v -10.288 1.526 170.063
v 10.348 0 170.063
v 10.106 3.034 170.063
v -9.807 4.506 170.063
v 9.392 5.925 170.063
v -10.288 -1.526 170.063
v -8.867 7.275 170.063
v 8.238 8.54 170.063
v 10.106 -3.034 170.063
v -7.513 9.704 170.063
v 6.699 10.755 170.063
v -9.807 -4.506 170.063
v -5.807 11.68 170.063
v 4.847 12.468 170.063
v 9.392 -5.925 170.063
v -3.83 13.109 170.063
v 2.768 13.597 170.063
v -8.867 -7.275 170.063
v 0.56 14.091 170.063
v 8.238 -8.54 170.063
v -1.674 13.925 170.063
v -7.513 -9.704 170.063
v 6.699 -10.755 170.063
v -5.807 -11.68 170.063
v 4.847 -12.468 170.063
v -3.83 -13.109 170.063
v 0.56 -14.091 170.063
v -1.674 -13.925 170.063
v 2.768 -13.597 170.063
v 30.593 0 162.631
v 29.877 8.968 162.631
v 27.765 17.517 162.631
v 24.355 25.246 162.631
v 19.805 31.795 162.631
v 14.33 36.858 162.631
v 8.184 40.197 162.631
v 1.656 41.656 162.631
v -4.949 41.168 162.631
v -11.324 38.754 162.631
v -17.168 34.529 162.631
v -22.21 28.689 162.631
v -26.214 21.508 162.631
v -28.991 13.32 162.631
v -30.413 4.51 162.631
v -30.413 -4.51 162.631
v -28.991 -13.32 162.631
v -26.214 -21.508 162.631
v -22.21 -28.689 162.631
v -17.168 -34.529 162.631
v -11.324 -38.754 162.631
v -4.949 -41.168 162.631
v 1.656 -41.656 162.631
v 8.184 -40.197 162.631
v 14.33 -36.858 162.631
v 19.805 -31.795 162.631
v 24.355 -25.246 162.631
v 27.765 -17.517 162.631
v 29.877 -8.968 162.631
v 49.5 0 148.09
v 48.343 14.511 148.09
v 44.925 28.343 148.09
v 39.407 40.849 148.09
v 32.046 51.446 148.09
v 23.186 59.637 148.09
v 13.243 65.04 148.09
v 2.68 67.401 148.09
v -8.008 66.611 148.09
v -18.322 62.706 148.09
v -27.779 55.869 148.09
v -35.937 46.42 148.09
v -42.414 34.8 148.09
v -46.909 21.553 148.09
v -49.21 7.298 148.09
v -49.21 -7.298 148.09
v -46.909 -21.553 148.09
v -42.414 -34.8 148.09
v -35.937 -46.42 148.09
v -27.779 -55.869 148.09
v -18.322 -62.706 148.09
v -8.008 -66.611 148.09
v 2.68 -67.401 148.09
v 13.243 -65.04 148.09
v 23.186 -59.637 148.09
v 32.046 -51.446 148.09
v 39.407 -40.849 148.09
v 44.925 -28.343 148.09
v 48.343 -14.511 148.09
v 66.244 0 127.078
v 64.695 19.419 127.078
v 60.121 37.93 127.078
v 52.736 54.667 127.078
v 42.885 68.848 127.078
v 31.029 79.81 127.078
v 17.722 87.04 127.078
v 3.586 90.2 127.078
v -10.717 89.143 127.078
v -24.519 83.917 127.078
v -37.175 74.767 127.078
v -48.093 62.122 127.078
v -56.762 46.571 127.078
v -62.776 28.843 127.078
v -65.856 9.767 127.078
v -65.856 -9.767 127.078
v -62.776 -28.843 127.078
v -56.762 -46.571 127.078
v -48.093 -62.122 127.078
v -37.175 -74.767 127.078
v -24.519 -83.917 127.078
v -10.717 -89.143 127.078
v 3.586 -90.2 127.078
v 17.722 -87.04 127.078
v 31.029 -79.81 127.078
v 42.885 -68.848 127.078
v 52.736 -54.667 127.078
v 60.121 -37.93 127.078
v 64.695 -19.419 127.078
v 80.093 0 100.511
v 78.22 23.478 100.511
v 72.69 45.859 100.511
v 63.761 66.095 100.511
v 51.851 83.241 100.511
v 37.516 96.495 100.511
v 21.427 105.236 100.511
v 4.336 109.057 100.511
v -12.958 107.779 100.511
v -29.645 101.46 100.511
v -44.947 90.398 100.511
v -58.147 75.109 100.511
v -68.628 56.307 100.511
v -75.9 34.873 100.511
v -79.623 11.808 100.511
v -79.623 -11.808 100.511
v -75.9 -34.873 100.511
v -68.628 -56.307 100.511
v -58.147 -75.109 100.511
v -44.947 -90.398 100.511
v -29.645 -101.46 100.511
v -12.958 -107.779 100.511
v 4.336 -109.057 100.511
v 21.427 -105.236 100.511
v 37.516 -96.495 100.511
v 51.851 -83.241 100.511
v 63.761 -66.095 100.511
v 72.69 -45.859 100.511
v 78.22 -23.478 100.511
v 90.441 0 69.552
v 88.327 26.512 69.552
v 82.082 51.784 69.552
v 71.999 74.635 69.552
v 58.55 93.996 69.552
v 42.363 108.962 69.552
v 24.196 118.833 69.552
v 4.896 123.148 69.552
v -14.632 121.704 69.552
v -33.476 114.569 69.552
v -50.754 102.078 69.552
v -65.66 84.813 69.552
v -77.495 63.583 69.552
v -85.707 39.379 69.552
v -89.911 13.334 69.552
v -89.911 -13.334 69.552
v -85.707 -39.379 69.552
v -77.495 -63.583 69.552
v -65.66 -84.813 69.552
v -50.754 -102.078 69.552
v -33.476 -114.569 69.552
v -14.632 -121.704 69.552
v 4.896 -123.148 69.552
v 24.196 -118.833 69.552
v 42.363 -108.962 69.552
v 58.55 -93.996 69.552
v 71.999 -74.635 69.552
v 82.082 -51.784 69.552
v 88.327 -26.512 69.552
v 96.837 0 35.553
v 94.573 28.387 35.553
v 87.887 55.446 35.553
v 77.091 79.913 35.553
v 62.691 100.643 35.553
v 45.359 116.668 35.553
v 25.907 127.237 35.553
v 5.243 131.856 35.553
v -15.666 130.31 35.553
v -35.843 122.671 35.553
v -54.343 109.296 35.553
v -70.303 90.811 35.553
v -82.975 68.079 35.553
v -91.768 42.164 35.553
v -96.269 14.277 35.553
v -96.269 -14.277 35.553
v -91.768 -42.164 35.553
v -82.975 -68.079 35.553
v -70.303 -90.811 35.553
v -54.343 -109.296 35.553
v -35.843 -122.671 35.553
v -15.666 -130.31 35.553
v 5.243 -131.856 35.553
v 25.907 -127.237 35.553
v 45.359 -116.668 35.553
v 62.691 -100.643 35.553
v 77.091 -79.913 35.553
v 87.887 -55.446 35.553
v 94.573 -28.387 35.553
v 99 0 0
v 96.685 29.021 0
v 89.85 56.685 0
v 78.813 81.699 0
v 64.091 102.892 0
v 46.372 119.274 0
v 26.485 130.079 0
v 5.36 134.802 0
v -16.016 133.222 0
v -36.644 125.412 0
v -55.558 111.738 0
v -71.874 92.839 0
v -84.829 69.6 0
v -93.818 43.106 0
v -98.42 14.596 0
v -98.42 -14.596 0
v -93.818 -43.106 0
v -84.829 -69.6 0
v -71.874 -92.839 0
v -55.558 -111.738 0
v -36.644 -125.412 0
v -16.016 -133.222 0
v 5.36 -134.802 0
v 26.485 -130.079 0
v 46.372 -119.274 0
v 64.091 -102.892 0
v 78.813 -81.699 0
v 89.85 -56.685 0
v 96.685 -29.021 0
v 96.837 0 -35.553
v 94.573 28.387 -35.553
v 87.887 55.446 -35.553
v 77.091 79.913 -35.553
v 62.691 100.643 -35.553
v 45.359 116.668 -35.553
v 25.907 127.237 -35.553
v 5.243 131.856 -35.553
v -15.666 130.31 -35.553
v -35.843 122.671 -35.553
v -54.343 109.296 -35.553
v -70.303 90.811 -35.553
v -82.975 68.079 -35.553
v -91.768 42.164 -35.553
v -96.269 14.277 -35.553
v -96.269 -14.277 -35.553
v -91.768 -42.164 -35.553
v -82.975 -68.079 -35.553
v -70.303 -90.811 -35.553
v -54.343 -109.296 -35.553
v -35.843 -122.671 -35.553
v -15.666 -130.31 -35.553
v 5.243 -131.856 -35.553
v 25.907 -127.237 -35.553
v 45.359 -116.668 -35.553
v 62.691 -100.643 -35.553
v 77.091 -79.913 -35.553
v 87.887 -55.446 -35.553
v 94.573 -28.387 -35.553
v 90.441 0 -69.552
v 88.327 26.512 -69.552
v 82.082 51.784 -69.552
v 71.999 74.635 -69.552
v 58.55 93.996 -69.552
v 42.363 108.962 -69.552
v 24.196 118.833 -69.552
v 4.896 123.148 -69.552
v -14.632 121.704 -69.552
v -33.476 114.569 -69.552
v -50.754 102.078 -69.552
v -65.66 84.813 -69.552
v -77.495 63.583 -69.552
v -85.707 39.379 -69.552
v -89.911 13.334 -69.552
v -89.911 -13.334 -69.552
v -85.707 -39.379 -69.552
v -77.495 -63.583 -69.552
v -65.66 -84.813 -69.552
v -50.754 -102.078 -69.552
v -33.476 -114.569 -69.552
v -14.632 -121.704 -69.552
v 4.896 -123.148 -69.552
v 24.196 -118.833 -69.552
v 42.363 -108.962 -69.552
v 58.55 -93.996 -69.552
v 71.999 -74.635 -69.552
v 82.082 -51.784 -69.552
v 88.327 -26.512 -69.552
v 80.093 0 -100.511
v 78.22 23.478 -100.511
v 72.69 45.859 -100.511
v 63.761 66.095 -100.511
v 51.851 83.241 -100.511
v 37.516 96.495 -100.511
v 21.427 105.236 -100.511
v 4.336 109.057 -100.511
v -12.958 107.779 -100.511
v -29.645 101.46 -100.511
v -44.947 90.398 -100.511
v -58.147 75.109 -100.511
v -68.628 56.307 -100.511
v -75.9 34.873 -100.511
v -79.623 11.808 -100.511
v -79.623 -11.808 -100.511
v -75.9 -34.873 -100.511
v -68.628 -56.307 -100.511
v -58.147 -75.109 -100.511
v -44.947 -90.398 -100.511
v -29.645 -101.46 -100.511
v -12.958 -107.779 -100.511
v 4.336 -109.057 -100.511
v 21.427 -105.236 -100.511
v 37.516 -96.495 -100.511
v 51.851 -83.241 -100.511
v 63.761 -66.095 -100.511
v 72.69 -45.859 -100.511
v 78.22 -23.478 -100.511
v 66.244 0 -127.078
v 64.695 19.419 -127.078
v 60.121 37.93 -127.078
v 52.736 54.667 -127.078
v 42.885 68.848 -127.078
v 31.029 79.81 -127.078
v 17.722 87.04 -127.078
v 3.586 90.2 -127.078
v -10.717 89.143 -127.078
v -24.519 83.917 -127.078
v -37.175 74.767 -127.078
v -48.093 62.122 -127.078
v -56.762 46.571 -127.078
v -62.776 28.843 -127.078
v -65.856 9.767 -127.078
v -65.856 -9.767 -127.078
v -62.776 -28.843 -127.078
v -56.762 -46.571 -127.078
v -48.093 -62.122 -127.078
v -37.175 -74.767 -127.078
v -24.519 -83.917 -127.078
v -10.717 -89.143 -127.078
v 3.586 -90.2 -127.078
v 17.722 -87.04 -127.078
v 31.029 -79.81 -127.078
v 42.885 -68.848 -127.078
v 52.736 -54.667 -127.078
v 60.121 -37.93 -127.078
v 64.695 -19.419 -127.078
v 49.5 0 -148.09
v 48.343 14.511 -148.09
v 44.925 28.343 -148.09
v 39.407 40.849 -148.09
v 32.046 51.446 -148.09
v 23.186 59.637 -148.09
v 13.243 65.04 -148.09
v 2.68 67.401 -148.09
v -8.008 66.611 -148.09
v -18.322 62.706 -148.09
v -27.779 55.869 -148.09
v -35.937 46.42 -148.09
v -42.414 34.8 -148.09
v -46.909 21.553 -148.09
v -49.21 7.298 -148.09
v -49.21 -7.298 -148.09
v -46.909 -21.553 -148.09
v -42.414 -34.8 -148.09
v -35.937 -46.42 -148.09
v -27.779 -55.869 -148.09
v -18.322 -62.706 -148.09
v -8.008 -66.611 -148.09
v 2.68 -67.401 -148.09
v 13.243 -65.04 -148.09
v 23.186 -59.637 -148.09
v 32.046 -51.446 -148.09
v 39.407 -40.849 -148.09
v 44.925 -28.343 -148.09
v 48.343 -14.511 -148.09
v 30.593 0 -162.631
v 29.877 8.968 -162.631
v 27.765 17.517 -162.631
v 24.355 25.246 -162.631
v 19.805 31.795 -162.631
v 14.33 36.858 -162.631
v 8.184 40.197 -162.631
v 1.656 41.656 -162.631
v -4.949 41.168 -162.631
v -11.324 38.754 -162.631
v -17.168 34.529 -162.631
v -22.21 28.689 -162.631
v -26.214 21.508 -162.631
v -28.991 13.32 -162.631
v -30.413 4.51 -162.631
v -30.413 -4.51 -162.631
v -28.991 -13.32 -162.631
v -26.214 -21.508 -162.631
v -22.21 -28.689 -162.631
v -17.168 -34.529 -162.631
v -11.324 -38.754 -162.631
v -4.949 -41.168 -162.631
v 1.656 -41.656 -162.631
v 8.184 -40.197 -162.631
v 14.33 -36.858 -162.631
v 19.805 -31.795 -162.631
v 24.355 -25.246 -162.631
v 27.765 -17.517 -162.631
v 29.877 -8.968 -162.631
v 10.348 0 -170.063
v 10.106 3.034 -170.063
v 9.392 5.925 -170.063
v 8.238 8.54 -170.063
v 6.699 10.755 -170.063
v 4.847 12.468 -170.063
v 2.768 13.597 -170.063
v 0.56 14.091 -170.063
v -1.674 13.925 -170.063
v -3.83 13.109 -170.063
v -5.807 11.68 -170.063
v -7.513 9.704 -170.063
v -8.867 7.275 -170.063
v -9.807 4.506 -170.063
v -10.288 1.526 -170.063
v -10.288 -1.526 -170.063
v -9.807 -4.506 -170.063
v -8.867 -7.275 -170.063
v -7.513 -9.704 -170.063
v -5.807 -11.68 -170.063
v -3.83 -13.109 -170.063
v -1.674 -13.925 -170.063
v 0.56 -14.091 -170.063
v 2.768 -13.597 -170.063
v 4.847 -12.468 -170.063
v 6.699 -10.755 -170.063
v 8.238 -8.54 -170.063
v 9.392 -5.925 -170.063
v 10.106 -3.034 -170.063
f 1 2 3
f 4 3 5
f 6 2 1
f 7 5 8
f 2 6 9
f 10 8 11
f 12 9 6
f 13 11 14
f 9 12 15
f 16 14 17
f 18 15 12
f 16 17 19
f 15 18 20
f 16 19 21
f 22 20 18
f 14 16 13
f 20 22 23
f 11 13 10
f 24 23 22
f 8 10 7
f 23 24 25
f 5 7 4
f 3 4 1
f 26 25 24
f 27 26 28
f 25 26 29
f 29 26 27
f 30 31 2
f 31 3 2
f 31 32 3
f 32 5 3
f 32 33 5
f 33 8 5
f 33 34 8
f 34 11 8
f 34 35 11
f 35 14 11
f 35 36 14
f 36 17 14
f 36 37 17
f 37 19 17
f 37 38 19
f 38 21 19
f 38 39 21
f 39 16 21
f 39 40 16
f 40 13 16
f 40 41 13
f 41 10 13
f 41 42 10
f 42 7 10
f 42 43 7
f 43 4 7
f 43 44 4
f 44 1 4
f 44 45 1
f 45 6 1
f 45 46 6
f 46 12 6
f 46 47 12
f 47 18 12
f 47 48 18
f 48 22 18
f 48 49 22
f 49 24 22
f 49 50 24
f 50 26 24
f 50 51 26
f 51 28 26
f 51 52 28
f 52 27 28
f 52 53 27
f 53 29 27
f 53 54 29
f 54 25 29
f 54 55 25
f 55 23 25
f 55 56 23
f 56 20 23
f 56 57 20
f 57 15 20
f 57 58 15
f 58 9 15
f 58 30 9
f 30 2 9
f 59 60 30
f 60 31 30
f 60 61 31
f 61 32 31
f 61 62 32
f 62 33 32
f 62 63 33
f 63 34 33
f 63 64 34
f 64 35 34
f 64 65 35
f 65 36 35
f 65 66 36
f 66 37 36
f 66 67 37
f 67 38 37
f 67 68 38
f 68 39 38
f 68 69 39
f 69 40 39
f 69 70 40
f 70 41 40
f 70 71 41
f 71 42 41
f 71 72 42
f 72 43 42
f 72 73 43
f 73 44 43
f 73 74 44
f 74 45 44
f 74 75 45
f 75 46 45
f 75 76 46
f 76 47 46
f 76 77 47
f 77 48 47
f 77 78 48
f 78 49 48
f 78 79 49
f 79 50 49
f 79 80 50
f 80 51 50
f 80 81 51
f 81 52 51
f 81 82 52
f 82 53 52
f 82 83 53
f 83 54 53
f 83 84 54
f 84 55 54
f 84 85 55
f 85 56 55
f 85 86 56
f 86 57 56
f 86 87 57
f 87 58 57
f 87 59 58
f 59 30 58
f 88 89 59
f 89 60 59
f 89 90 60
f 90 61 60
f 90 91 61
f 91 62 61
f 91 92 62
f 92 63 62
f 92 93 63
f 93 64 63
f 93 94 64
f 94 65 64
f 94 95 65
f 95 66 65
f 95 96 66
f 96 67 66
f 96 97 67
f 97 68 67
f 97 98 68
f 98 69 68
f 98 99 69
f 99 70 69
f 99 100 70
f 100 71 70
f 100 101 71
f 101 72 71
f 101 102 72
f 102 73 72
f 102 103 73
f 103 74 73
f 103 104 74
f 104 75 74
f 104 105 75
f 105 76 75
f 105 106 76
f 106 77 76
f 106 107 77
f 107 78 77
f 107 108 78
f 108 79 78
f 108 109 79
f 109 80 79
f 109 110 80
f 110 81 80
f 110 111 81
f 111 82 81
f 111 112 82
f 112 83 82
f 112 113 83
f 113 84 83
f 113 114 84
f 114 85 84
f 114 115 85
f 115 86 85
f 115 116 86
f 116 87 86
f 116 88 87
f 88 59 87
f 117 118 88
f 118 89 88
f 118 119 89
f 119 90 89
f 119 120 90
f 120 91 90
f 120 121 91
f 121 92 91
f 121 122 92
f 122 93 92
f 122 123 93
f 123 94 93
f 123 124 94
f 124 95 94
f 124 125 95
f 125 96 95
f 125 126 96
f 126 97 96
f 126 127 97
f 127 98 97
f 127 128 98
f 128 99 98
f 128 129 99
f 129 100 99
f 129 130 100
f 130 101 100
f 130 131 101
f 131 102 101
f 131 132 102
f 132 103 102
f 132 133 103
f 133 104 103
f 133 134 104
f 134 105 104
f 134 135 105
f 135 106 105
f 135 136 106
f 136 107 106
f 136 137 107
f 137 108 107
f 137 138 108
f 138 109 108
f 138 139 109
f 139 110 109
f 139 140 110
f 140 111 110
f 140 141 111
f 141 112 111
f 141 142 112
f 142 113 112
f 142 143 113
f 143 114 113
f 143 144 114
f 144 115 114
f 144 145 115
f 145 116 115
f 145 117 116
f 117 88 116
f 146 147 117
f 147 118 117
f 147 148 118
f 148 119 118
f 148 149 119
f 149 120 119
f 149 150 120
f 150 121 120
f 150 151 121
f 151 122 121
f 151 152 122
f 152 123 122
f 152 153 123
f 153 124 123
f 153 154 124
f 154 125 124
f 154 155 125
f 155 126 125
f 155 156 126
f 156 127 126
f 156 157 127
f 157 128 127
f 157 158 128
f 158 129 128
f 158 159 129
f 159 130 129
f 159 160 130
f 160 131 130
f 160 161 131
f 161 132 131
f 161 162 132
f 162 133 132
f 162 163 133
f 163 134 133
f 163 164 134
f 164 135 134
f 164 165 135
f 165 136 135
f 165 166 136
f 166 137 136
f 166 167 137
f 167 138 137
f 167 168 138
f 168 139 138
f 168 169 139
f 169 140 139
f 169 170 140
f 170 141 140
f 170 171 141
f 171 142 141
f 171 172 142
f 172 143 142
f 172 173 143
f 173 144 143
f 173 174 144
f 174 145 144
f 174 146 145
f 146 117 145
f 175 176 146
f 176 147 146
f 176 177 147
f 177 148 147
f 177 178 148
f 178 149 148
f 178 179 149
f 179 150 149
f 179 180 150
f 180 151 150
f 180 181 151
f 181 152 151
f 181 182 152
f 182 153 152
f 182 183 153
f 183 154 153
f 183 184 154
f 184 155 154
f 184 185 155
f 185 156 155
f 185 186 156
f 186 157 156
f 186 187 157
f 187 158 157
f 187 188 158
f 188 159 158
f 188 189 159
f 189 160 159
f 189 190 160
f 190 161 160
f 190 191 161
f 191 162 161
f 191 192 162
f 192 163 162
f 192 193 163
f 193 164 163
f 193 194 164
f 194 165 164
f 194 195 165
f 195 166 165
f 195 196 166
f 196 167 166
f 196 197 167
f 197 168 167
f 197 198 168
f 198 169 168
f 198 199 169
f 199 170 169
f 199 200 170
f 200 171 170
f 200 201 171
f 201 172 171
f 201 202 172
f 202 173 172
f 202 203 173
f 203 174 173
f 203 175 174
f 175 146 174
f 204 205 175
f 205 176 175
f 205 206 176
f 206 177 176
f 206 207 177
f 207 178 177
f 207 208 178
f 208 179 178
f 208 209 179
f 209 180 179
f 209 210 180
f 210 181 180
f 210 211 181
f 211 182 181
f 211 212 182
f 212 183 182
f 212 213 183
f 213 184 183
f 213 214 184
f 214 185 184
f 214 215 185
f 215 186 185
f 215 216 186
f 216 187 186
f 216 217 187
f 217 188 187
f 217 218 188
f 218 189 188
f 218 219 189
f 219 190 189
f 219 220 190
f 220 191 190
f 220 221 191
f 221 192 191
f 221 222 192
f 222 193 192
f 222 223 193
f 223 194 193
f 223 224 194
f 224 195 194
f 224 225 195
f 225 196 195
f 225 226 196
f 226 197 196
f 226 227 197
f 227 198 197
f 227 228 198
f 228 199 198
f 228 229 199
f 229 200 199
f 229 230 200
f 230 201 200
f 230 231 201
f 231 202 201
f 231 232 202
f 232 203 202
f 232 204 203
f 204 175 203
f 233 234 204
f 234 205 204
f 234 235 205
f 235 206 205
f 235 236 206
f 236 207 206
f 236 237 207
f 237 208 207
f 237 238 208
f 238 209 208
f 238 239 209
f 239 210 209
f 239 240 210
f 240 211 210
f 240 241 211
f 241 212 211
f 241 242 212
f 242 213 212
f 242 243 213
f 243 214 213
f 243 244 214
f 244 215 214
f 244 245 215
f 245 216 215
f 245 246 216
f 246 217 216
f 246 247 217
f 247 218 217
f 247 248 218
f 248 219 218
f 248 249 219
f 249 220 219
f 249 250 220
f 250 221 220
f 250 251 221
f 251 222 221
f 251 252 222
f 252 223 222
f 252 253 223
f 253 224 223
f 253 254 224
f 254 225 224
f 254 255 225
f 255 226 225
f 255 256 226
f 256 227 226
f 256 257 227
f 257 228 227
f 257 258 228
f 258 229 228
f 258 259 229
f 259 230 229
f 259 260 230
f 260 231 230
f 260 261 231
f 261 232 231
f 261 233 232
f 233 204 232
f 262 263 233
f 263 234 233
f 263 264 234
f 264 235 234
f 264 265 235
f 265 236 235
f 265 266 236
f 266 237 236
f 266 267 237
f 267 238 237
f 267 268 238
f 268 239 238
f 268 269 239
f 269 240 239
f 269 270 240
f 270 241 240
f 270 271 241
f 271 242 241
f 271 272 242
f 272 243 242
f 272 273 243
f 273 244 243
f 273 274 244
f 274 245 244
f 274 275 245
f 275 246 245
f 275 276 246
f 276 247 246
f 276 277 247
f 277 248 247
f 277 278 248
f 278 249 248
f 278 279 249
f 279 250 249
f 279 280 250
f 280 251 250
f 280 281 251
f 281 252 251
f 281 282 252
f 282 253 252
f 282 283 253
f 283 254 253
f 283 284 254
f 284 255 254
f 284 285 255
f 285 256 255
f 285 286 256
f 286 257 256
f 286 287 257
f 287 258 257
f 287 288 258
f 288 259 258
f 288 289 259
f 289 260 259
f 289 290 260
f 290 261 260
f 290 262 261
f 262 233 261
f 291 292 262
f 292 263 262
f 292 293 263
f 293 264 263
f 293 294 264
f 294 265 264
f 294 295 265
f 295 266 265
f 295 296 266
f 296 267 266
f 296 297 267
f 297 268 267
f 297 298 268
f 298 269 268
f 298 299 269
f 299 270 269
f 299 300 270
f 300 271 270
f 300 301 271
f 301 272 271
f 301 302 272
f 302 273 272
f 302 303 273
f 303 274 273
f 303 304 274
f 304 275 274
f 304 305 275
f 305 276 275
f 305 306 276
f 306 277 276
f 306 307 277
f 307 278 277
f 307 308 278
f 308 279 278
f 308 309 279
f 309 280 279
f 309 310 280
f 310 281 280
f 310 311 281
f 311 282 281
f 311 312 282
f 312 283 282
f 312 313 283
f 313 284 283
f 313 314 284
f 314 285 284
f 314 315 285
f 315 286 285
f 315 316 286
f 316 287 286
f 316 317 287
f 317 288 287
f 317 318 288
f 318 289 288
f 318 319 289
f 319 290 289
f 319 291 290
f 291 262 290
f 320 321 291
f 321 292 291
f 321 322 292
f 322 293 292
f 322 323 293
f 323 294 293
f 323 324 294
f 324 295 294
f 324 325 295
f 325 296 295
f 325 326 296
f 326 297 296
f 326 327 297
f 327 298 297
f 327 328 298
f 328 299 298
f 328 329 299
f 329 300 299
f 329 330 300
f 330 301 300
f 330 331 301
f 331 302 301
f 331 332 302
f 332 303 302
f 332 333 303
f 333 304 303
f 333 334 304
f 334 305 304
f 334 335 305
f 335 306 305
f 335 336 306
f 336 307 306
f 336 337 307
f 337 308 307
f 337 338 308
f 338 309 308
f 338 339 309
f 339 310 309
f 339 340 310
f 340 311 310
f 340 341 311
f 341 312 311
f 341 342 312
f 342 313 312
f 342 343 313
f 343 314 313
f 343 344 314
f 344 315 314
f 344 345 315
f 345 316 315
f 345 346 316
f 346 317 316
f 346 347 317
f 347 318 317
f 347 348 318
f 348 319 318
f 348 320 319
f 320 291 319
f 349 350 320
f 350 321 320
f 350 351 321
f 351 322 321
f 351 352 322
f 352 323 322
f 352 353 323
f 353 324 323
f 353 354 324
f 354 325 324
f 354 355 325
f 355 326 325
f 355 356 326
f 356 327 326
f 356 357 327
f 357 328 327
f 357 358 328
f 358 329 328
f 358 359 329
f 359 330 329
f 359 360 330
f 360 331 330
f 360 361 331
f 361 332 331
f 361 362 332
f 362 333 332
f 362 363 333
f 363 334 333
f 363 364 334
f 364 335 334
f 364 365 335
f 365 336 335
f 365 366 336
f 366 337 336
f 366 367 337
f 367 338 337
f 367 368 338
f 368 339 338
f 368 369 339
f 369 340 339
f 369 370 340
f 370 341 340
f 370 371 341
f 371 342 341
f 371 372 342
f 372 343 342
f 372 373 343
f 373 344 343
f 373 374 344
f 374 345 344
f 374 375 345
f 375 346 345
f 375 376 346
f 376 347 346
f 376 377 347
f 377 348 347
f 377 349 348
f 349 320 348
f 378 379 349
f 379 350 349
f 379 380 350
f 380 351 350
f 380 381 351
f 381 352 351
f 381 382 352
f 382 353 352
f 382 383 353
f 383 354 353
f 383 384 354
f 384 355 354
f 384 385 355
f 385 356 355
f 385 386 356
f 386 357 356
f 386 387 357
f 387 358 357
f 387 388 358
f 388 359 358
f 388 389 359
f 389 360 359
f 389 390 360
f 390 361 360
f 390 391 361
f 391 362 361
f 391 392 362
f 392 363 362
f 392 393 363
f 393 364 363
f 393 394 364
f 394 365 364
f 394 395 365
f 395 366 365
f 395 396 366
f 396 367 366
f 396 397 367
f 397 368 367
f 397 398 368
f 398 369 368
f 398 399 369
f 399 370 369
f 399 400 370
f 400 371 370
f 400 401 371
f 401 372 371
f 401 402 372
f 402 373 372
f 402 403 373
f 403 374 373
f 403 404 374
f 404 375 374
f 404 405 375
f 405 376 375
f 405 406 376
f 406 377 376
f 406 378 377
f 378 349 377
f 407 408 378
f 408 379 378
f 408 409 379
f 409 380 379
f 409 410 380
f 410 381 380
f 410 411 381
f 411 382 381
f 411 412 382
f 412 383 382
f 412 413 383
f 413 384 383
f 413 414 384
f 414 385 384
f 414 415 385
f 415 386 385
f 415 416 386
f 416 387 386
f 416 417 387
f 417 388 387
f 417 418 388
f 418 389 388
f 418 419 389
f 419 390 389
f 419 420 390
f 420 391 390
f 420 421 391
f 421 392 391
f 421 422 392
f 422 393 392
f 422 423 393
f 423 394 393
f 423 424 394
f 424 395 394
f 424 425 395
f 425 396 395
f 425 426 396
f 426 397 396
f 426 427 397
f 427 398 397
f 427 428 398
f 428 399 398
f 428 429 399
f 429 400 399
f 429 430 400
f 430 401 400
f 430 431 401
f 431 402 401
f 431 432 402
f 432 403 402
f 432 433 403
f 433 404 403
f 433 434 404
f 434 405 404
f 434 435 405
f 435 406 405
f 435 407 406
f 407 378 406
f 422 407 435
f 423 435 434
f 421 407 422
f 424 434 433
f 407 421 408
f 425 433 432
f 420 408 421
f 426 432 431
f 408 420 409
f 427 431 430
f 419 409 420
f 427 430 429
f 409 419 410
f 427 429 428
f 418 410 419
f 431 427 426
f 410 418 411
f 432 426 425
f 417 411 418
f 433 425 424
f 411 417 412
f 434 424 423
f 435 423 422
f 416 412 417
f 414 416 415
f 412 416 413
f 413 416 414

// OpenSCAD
// Generated by SolidPython 1.0.1 on 2020-07-29 00:46:50


scale(v = [11, 15, 19]) {
	sphere(r = 9);
}
/***********************************************
*********      SolidPython code:      **********
************************************************
 
# import packages: SolidPython
from solid import *
from solid.utils import *
from itertools import chain, combinations, permutations


class Resize:

    def __init__(self, scad_file):
        self.scad_file = scad_file
        #self.scad_file = import_scad(scad_file)
        # cone/cylinder param:
        self.r1 = 0
        self.r2 = 0
        self.h = 0
        # rectangular prism param:
        self.w = 0
        self.l = 0
        # ellipse param:
        self.r = 0

    # import OpenScad code (file name corresponds to shape)


    # classify shape + parameters
    def assign(self, param1, param2, param3):
        if self.scad_file == 'cone.scad':
            self.r1 = param1
            self.r2 = param2
            self.h = param3
        elif self.scad_file == 'cylinder.scad':
            self.r1 = param1
            self.r2 = param2
            self.h = param3
        elif self.scad_file == 'rectangularPrism.scad':
            self.h = param1
            self.l = param2
            self.w = param3
        else:
            self.r = param1
            self.h = param2

    # resize parameters
    def iterate(self):
        x = range(3, 20, 2)
        i = 1
        if self.scad_file == 'cone.scad':
            tempList = list(permutations(x, 2))
            for temp in tempList:
                param1 = temp[0]
                param2 = temp[1]
                filepath = 'produced_scad_files/' + 'cone' + str(param1) + '_' + str(param2) + '_' + '.scad'
                scad_render_to_file(cylinder(h=param1, r1=param2, r2=0), filepath)

        elif self.scad_file == 'cylinder.scad':
            tempList = list(permutations(x, 3))
            for temp in tempList:
                param1 = temp[0]
                param2 = temp[1]
                filepath = 'produced_scad_files/' + 'cylinder' + str(param1) + '_' + str(param2) + '_' + '.scad'
                scad_render_to_file(cylinder(h=param1, r1=param2, r2=param2), filepath)

        elif self.scad_file == 'rectangularPrism.scad':
            tempList = list(permutations(x, 3))
            for temp in tempList:
                param1 = temp[0]
                param2 = temp[1]
                param3 = temp[2]
                filepath = 'produced_scad_files/' + 'rectangularPrism' + str(param1) + '_' + str(param2) + '_' + str(
                    param3) + '.scad'
                scad_render_to_file(cube(size=(param1, param2, param3)), filepath)

        elif self.scad_file == 'ellipse.scad':
            tempList = list(permutations(x, 4))
            for temp in tempList:
                param1 = temp[0]
                param2 = temp[1]
                param3 = temp[2]
                param4 = temp[3]
                filepath = 'produced_scad_files/' + 'ellipse' + str(param1) + '_' + str(param2) + '_' + str(param3) + '_' + str(param4) + '.scad'
                scad_render_to_file(scale([param1, param2, param3])(sphere(r=param4)), filepath)

    def render_to_scadfile(self):
        scad_render_to_file(scad, 'example.scad') 
 
************************************************/
